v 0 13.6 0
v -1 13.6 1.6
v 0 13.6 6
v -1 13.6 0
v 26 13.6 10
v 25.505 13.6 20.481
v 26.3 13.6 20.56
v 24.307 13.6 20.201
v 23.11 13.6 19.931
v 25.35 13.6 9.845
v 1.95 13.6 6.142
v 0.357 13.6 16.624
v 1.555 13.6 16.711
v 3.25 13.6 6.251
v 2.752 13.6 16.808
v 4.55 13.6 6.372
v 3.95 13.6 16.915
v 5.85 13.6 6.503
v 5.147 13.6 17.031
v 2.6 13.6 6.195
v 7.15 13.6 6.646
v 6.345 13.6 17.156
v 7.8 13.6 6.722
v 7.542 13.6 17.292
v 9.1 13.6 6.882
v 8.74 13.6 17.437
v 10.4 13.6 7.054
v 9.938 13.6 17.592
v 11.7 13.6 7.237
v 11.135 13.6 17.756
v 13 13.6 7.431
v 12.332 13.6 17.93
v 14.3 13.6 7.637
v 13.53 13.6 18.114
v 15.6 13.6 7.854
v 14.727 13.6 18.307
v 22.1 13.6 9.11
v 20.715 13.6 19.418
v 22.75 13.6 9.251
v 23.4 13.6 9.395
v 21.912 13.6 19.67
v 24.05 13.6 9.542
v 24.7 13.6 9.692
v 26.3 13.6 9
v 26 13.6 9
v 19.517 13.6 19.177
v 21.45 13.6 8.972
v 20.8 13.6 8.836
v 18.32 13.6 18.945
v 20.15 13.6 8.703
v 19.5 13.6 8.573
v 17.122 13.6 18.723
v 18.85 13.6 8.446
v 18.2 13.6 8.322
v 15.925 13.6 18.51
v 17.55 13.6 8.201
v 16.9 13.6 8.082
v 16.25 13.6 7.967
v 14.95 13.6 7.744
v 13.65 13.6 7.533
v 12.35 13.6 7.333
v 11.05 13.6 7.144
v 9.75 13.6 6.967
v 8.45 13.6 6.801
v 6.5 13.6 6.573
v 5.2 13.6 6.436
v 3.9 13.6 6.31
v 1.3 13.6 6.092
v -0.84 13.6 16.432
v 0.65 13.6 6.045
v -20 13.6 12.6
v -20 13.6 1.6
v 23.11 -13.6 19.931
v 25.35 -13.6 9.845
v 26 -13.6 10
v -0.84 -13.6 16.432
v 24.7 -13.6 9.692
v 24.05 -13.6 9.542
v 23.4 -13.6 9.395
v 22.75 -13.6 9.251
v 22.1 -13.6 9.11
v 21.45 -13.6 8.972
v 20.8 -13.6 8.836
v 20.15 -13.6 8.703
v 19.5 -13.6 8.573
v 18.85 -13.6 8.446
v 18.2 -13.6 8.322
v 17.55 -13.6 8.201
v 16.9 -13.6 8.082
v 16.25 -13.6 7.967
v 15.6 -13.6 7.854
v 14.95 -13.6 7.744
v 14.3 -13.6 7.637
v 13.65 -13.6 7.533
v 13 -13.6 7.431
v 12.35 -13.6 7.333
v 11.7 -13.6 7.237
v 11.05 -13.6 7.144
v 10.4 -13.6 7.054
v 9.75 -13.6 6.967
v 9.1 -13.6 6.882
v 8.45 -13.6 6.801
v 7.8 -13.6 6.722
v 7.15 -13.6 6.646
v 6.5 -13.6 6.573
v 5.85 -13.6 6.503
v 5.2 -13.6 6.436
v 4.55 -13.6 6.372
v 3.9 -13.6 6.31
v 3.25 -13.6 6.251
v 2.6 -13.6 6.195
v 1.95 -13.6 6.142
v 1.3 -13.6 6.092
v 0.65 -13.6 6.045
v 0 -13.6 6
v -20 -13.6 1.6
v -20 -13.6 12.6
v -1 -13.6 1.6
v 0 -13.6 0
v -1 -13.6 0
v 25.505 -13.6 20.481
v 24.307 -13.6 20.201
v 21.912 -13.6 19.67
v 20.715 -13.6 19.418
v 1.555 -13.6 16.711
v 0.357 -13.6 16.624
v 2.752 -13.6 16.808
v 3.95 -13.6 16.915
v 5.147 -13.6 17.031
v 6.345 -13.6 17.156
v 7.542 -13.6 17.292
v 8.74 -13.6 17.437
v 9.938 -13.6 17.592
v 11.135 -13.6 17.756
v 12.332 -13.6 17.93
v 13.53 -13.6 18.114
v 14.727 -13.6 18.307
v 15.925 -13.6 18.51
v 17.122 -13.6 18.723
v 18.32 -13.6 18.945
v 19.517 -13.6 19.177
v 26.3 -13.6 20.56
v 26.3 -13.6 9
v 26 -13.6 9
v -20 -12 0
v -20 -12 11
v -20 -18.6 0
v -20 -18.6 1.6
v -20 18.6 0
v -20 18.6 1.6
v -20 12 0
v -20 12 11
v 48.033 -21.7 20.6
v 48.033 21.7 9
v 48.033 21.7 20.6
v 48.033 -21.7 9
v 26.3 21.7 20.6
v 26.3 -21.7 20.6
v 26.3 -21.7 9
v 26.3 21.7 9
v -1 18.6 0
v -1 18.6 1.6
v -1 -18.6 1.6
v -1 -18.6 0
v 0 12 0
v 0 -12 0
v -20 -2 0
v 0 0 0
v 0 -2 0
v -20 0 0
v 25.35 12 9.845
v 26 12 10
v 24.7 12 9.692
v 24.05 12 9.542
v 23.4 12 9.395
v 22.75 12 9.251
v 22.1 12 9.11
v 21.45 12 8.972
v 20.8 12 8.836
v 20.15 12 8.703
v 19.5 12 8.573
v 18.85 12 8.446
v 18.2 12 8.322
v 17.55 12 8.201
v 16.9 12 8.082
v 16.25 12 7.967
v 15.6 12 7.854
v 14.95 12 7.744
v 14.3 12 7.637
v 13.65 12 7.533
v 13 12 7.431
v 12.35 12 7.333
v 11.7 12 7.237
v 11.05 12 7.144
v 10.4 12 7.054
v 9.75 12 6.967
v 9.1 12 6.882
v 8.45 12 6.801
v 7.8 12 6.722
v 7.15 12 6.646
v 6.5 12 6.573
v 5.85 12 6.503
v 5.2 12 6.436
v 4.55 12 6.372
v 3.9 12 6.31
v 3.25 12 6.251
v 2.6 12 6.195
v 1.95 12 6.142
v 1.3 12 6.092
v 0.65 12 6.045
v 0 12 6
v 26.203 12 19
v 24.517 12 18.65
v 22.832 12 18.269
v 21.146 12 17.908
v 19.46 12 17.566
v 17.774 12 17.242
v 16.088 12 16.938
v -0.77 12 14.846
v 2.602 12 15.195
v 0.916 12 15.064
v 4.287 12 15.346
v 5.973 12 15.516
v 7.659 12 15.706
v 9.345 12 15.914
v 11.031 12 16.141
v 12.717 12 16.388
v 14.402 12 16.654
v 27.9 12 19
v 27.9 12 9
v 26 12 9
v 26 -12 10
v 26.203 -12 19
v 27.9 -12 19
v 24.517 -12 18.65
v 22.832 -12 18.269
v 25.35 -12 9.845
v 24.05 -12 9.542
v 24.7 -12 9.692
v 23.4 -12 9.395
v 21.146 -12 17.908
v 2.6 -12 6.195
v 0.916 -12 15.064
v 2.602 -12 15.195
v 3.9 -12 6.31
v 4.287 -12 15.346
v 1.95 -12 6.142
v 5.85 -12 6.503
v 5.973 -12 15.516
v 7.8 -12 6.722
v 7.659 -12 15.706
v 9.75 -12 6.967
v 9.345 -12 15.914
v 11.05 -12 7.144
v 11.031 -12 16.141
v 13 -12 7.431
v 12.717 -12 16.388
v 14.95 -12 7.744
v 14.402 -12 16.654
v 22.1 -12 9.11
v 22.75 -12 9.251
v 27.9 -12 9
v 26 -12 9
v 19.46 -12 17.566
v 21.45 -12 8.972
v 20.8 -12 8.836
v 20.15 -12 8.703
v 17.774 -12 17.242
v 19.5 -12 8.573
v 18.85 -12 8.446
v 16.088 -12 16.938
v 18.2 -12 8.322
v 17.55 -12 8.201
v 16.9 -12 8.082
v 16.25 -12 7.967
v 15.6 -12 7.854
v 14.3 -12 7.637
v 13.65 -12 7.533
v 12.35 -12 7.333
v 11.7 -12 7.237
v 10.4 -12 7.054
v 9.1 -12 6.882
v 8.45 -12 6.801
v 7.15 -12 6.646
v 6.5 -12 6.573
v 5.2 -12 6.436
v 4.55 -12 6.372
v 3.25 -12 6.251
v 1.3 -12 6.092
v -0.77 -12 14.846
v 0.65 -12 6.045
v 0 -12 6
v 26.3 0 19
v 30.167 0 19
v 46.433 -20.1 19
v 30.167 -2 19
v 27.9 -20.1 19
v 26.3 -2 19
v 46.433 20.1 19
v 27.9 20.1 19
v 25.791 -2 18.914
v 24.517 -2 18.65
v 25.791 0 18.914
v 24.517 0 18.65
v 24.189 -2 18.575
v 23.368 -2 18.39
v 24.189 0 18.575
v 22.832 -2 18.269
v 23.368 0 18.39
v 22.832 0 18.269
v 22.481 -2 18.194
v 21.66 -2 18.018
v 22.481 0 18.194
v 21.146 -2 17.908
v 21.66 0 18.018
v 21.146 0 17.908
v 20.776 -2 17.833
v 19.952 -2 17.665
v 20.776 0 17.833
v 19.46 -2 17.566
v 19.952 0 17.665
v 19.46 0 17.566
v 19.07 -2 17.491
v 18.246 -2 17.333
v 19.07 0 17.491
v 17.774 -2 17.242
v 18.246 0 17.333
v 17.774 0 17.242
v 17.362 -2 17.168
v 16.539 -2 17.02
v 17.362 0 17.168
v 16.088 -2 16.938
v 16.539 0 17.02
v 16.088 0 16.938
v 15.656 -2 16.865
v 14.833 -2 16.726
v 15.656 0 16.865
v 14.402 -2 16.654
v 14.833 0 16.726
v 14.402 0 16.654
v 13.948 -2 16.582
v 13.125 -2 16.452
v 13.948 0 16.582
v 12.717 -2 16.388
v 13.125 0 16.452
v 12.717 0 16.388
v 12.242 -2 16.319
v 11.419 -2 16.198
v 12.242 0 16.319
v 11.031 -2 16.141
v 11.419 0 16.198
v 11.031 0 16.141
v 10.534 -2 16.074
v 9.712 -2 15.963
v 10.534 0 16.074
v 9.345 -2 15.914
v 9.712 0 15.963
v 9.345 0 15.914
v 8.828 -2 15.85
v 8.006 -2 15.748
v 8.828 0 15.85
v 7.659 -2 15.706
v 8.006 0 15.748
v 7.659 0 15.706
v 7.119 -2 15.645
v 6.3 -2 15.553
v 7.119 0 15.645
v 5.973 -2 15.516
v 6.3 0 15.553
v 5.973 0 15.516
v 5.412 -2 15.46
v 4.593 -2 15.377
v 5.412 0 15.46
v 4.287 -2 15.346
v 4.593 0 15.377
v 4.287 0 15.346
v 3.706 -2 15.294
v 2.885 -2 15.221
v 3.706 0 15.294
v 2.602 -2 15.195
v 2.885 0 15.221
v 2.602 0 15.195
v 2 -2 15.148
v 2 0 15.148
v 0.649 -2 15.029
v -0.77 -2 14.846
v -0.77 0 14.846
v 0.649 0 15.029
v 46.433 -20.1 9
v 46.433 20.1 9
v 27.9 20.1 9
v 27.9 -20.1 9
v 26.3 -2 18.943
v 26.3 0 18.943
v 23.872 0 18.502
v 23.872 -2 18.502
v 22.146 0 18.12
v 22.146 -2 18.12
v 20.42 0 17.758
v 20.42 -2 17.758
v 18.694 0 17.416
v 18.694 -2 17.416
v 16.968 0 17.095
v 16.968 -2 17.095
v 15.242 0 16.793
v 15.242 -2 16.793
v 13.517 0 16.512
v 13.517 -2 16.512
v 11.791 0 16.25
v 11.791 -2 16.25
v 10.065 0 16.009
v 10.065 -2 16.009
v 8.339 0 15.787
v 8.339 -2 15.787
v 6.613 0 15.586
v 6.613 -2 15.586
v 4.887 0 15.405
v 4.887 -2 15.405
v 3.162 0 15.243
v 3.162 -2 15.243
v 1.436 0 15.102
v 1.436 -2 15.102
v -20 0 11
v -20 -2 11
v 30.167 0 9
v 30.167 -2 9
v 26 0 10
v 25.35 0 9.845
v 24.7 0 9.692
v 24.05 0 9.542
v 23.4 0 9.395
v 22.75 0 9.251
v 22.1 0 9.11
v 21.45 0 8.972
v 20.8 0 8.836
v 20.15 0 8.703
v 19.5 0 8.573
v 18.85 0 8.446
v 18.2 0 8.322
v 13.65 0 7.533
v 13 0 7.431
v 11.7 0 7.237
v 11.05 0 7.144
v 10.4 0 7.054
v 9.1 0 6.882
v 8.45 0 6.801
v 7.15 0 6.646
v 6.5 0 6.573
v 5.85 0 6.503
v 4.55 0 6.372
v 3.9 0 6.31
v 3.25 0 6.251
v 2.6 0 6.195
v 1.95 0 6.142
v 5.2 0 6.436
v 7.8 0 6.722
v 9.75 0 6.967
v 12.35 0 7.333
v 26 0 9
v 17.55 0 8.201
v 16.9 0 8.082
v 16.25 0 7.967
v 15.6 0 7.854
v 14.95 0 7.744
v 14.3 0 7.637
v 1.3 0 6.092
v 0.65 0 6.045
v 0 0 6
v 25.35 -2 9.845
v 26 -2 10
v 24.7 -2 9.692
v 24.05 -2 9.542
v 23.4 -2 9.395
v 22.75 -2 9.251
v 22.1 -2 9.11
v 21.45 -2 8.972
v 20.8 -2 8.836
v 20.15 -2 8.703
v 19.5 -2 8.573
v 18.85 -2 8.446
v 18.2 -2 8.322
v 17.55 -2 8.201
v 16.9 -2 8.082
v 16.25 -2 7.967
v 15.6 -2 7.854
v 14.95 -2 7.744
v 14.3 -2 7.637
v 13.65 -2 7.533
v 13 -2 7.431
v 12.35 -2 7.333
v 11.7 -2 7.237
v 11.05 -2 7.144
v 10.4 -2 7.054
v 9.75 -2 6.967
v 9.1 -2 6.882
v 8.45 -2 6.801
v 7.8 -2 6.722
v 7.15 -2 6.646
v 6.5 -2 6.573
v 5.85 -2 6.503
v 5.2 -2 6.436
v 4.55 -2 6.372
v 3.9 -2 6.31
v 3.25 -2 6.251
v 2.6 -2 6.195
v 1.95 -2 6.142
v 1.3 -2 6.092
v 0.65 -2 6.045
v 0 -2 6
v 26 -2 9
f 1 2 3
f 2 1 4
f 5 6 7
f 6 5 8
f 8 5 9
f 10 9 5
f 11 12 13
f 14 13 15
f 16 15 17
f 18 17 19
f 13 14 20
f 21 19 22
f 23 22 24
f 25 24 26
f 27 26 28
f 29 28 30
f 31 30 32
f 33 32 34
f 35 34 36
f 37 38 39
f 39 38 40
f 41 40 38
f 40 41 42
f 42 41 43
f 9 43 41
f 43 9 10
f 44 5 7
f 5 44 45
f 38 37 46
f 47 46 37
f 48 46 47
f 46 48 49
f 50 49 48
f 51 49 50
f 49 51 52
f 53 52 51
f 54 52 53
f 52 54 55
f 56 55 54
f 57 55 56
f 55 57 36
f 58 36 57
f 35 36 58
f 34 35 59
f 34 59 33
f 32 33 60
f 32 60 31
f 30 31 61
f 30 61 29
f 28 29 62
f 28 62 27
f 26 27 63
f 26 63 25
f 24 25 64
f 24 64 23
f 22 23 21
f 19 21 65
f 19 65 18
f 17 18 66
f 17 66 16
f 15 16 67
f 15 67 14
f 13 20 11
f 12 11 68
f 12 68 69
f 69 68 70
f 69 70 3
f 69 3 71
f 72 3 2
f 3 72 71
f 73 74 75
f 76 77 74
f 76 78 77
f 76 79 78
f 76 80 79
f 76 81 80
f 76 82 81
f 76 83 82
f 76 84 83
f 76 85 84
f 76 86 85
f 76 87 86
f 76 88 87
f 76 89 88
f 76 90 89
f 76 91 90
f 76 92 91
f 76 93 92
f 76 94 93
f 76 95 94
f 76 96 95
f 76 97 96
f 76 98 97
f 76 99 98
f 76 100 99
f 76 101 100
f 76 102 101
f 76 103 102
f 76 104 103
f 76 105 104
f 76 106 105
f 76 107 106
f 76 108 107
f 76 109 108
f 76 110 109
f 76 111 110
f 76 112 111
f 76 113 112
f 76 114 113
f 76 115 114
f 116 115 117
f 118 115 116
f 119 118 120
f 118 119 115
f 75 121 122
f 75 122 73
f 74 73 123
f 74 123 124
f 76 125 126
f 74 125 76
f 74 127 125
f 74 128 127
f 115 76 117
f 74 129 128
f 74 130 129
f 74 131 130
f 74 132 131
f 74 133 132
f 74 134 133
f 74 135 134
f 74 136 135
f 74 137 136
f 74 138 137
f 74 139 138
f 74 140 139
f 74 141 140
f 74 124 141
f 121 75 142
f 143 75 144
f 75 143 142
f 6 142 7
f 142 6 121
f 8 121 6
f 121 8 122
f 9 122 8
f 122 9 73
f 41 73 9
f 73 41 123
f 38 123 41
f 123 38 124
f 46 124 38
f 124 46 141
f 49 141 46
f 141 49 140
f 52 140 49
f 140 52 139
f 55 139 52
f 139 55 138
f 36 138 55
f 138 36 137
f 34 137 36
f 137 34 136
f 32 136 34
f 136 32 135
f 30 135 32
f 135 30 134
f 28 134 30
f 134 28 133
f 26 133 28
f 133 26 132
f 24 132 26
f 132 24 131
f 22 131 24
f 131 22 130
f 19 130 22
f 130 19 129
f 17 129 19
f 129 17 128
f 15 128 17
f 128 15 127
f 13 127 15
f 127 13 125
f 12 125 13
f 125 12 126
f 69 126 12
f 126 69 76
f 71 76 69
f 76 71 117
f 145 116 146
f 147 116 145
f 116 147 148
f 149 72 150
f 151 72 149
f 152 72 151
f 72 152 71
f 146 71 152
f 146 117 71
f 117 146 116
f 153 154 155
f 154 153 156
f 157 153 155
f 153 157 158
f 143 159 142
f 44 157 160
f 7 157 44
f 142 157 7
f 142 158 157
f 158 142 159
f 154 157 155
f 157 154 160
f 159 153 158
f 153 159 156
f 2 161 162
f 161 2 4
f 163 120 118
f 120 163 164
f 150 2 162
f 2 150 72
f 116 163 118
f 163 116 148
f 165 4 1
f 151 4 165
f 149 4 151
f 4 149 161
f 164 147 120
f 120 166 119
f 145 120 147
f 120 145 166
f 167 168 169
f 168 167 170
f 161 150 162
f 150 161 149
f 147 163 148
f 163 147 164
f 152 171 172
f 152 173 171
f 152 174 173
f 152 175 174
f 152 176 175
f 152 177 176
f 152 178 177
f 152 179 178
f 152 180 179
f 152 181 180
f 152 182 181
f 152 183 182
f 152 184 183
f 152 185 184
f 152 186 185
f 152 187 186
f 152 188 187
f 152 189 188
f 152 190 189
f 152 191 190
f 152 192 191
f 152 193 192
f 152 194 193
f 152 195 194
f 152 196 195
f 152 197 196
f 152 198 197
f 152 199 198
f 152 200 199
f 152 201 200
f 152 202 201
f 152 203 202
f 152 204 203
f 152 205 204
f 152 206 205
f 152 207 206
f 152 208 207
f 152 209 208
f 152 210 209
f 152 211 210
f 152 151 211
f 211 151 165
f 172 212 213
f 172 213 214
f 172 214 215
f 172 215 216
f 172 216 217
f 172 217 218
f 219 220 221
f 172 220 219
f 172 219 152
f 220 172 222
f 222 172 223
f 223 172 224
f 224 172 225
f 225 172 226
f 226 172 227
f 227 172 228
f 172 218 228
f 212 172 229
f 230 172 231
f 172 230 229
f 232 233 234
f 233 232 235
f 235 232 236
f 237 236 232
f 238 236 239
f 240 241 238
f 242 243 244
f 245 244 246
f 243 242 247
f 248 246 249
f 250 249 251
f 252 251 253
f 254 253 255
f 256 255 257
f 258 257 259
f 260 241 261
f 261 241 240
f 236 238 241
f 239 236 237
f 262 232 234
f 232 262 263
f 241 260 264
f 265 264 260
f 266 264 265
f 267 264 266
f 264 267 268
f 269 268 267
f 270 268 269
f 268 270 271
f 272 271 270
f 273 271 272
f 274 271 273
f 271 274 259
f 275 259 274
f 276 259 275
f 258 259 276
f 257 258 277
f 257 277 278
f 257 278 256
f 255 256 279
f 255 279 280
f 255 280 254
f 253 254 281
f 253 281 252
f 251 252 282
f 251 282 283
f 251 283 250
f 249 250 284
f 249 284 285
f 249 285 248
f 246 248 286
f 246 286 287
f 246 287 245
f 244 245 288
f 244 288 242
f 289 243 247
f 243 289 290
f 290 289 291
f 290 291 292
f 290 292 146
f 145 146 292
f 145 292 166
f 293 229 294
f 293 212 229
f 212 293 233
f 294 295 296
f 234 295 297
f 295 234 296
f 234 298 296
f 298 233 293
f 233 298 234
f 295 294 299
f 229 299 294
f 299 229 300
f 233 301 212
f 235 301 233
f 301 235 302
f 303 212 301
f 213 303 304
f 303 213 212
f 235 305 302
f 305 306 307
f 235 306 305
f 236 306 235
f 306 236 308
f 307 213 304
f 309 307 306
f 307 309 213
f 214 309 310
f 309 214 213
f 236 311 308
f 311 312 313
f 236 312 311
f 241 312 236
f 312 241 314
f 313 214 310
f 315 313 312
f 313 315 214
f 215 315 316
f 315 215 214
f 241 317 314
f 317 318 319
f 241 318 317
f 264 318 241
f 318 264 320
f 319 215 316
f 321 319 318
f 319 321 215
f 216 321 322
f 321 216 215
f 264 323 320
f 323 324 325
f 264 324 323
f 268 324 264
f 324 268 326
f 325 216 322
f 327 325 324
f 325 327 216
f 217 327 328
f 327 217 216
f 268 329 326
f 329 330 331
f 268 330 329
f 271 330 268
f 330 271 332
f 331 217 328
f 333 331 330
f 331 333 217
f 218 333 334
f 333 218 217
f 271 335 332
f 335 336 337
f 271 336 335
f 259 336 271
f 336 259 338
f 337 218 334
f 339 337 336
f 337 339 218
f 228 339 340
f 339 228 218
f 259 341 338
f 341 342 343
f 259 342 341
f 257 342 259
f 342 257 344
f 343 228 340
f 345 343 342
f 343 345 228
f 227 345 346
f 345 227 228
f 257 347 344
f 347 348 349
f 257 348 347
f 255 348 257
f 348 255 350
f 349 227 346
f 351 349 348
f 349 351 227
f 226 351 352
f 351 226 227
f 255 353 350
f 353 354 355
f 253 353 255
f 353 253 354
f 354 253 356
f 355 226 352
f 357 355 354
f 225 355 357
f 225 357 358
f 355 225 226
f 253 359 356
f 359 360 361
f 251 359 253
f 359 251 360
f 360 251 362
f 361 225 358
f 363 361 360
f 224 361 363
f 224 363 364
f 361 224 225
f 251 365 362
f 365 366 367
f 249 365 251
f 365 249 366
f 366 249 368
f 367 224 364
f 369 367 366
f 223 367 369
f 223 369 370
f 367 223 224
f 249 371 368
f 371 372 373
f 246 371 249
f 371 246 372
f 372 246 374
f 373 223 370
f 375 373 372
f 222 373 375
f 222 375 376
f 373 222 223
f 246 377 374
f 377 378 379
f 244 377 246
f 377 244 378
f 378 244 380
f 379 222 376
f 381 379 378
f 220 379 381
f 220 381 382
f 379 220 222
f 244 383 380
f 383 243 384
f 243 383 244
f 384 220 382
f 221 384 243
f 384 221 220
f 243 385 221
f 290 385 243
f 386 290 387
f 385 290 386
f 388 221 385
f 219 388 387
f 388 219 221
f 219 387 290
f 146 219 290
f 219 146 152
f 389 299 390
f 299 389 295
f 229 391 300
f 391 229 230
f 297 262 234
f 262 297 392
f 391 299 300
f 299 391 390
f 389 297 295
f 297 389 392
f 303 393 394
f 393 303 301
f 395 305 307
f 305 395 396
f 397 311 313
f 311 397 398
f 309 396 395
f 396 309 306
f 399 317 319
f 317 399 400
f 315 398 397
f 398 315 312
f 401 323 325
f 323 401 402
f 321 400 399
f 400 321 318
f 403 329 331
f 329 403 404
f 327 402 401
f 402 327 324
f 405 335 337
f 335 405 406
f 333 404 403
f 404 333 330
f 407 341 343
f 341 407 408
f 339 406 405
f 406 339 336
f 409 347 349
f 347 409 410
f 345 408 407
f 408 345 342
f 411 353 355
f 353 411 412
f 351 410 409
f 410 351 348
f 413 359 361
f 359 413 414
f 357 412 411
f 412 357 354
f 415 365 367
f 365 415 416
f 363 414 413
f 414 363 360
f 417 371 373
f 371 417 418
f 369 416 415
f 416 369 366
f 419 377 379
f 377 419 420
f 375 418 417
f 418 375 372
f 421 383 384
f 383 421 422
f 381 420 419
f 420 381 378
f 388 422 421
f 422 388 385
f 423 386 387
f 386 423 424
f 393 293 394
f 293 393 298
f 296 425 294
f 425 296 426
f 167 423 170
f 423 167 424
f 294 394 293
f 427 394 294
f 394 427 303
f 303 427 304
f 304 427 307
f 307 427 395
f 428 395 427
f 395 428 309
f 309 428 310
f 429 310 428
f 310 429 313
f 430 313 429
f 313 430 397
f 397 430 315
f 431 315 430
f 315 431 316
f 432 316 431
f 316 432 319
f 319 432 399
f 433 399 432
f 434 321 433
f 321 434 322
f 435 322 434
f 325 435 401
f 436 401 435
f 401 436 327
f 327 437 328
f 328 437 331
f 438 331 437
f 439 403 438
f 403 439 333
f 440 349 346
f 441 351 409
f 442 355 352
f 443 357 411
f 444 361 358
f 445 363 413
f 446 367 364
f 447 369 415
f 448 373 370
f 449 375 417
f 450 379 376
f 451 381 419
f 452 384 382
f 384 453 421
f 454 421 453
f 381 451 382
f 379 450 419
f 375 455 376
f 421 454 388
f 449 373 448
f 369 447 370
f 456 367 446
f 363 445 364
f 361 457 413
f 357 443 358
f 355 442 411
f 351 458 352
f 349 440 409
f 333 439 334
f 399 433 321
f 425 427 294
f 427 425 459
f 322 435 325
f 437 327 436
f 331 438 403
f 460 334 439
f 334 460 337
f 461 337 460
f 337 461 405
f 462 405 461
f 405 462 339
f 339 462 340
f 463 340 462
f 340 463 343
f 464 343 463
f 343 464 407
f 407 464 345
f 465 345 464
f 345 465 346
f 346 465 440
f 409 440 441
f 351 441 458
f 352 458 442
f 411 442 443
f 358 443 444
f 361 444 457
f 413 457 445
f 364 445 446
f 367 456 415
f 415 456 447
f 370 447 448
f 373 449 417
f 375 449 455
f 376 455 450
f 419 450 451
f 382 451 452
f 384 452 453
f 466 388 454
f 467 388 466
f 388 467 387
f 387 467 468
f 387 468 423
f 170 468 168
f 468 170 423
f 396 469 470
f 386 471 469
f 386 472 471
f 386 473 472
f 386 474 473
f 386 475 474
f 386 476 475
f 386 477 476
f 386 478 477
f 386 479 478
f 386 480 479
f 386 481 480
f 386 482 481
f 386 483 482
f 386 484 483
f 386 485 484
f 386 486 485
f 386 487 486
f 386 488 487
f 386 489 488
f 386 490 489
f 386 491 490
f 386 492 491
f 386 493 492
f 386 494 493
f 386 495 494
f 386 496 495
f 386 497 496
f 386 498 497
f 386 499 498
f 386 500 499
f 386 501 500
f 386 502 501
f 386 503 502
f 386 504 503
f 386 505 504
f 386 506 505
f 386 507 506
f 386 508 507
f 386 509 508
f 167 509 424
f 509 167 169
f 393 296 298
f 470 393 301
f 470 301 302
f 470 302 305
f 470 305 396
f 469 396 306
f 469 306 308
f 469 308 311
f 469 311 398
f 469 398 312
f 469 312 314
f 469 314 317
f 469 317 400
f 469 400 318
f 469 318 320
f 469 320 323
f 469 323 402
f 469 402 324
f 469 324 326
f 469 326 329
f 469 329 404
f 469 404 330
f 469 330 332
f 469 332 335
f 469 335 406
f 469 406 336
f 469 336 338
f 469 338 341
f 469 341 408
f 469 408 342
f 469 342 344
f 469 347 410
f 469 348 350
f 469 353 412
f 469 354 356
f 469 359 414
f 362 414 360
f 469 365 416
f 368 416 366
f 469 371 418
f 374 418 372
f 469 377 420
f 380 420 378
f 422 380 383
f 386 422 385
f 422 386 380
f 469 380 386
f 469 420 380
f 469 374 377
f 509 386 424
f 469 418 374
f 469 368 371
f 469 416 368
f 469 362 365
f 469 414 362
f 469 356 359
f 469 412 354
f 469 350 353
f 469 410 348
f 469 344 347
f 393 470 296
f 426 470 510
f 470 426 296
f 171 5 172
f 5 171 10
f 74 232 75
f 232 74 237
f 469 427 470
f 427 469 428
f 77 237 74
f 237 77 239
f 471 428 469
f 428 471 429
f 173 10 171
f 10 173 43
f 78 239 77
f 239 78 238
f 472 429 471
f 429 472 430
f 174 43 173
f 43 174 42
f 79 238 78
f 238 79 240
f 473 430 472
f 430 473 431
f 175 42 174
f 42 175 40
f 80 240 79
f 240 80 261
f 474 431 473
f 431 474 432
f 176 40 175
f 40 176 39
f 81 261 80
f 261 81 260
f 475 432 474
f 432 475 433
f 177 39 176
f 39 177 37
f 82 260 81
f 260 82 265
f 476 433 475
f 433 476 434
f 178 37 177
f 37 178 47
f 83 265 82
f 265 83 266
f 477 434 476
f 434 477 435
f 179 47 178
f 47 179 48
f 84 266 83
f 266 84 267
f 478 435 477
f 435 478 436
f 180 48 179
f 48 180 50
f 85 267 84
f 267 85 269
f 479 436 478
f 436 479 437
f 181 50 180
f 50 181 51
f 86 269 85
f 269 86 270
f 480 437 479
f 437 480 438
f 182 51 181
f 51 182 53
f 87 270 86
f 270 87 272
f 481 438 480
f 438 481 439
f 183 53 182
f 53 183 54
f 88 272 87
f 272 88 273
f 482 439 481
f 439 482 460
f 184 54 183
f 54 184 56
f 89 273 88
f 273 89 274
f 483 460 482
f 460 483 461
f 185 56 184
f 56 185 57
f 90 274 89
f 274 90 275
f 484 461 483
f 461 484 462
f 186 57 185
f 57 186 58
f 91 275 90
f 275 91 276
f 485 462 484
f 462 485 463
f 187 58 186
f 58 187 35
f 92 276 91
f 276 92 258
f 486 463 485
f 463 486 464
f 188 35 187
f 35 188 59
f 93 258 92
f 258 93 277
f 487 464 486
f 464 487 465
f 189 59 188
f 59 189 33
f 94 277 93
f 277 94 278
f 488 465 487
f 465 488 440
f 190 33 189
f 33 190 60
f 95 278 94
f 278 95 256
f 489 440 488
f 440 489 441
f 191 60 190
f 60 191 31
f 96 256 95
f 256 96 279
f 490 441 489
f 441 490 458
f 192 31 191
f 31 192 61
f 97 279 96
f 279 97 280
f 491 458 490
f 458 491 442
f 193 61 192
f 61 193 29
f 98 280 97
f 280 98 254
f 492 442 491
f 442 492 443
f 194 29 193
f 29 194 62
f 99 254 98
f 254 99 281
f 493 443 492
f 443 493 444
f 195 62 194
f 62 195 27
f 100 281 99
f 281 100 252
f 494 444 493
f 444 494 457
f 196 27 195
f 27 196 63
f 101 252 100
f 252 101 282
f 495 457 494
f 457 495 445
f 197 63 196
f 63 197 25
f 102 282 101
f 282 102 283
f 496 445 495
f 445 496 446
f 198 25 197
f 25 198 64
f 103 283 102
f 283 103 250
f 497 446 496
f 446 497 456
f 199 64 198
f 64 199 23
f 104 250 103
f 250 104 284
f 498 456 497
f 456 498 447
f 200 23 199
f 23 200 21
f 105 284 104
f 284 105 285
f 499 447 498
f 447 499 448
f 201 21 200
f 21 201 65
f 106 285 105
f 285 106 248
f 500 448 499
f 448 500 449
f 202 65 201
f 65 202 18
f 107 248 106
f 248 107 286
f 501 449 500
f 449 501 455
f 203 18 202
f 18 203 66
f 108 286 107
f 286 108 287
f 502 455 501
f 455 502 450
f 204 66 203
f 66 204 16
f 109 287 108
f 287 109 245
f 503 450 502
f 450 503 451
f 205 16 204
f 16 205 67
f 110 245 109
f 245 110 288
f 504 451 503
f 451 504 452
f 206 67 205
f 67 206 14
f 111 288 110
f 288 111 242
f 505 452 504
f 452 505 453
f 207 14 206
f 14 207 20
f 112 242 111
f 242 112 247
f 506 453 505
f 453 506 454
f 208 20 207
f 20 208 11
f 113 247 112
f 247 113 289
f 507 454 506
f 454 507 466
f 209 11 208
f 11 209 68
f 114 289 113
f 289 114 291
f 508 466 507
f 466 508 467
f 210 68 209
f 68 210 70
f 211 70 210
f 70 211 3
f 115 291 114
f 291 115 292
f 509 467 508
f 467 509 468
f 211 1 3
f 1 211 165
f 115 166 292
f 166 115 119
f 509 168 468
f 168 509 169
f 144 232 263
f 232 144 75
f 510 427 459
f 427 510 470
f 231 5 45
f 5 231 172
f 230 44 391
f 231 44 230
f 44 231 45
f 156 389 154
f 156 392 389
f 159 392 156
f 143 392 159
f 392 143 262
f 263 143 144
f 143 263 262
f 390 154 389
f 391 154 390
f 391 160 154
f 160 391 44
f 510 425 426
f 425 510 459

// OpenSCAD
// ============================================================
//  Cable cover: indoor 503 (BTicino Livinglight, 3 modules) -> ESP32 box
//
//  The cables (230 V + 2 ethernet from the outdoor plate) leave the
//  indoor 503 through a PRE-DRILLED Livinglight blank in the leftmost
//  module. This cover:
//    - sits on the blank face, inside the plate window (it covers the
//      whole module, so it looks like a module of its own);
//    - climbs over the curved left border of the plate;
//    - crosses the gap to the wall and ends against the right wall of
//      the ESP32 box, in front of its side opening (signals above the
//      rib, 230 V below).
//  Open at the back (like a trunking): the wall, the plate and the blank
//  close it. An inner divider keeps the 230 V cable apart from the
//  ethernet cables all the way to the box (it ends at the blank hole).
//
//  Fixing: removable double-sided tape under the wall flanges and under
//  the cap walls. DO NOT glue it hard to the blank: the cover sits over
//  the plate border, so it must come off (pull it forward) before the
//  plate can be removed.
//
//  Box position: right wall of the box "gap" mm from the left edge of the
//  plate, TOP edge of the box box_top_y mm above the plate centre, so that
//  its side opening is centred on the plate (default: 124.4 mm above; the
//  ENCLOSURE line in the console of the box file gives the same number).
//
//  Coordinates: x to the right (x = 0 at the left edge of the plate),
//  y up (y = 0 at the plate centre), z out of the wall (z = 0 on the wall).
//  Print: lying on its top face (roof down), no supports except the
//  flanges (or print with the flanges on the bed: see print_flip).
//  Material: PETG (as the box).
// ============================================================

/* [Plate (measured)] */
pl_w     = 117.5;  // plate width
pl_h     = 78;     // plate height
win_w    = 67;     // window width (3 modules)
win_h    = 44;     // window height
bord_w   = 26;     // left border: outer edge -> window
t_edge   = 6;      // plate thickness at the outer edge
t_10     = 7;      // ... 10 mm in from the outer edge
t_max    = 10;     // ... at the window
blank_rec= 1;      // blank face behind the plate face

/* [Blank hole] */
hole_d   = 12;     // hole in the pre-drilled blank (drill it to 16 for 3 cables)
hole_dy  = 0;      // hole centre above the plate centre

/* [Channel] */
gap      = 20;     // plate left edge -> box right wall
ch_in_w  = 24;     // inner width (= box opening: 12 signals + 2 rib + 10 mains)
ch_clear = 9;      // inner height over the plate (largest cable + ~1)
open_h   = 11;     // box opening height (side_open_h in the box file)
t        = 1.6;    // wall / roof thickness
div_t    = 2;      // divider thickness (= the rib of the box)
div_y    = -2;     // divider bottom edge (y): 230 V below, signals above
flange_w = 5;      // wall flanges for the tape (each side, in the gap)
cap_clr  = 0.3;    // cap clearance in the window
cap_mods = 1;      // modules covered by the cap: 1 (pre-drilled blank only)
                   // or 2 (also the plain blank next to it: more room inside)
mod_w    = win_w/3; // window modules, from the left: pre-drilled blank,
                    // blank, Italian socket

/* [Box (for the preview only)] */
box_out_w = 144.8;
box_out_h = 257.2;
box_out_d = 36.6;
box_top_y = 124.4;  // top edge of the box above the side opening centre

$fn = 48;

// ---- derived ----
blank_z = t_max - blank_rec;
// left border profile: parabola through (0,t_edge) (10,t_10) (bord_w,t_max)
pa = ((t_max - t_edge) - (t_10 - t_edge) * bord_w / 10) / (bord_w*bord_w - 10*bord_w);
pb = (t_10 - t_edge) / 10 - pa * 10;
function pz(x) = x < 0 ? 0 : x <= bord_w ? t_edge + pb*x + pa*x*x : t_max;

cap_x0 = bord_w + cap_clr;
cap_x1 = bord_w + cap_mods*mod_w - cap_clr;
cap_h  = win_h - 2*cap_clr;
hole_x = bord_w + mod_w/2;
cap_zi = t_max + ch_clear;              // inside of the cap roof
// roof inside: ramps from the box opening up to the plate, then follows it
function zi(x) = x < 0 ? open_h + (pz(0) + ch_clear - open_h) * (x + gap) / gap
                       : min(pz(x) + ch_clear, cap_zi);
function zo(x) = zi(x) + t;

// region under f between x0 and x1, in the xz plane, y from y0 to y1
module under(x0, x1, y0, y1, outer = true, n = 40) {
    pts = concat([[x0, -1]],
                 [for (i = [0:n]) let(x = x0 + (x1 - x0) * i / n)
                     [x, outer ? zo(x) : zi(x)]],
                 [[x1, -1]]);
    translate([0, y1, 0]) rotate([90, 0, 0])
        linear_extrude(y1 - y0) polygon(pts);
}

// what is already there: wall, plate, blank
module env() {
    translate([-500, -500, -50]) cube([1000, 1000, 50]);
    difference() {
        translate([0, pl_h/2, 0]) rotate([90, 0, 0]) linear_extrude(pl_h)
            polygon(concat([[0, -1]],
                [for (i = [0:40]) let(x = bord_w * i / 40) [x, pz(x)]],
                [[pl_w - bord_w, t_max], [pl_w, t_edge], [pl_w, -1]]));
        translate([bord_w, -win_h/2, -1]) cube([win_w, win_h, 50]);
    }
    translate([bord_w, -win_h/2, -1]) cube([win_w, win_h, blank_z + 1]);
}

module cover() {
    yo = ch_in_w/2 + t;
    difference() {
        union() {
            difference() {
                union() {
                    under(-gap, cap_x0 + t, -yo, yo);                       // channel
                    translate([cap_x0, -cap_h/2, 0])
                        cube([cap_x1 - cap_x0, cap_h, cap_zi + t]);          // cap
                    translate([-gap, -yo - flange_w, 0])
                        cube([gap - 1, 2*(yo + flange_w), t]);               // flanges
                }
                under(-gap - 1, cap_x1 - t, -ch_in_w/2, ch_in_w/2, false);   // channel inside
                translate([cap_x0 + t, -cap_h/2 + t, -1])
                    cube([cap_x1 - cap_x0 - 2*t, cap_h - 2*t, cap_zi + 1]);  // cap inside
                translate([-gap - 1, -ch_in_w/2, -1])
                    cube([gap, ch_in_w, open_h + 1]);                         // flanges: cable path
            }
            // divider: from the box to the edge of the blank hole
            intersection() {
                translate([-gap, div_y, -1])
                    cube([hole_x - hole_d/2 - 1 + gap, div_t, 100]);
                union() {
                    under(-gap - 1, cap_x1, -50, 50, false);
                    translate([cap_x0, -50, -1]) cube([cap_x1 - cap_x0, 100, cap_zi + 1]);
                }
            }
        }
        env();
    }
}

cover();

// preview of the surroundings (%: not exported)
%env_preview();
module env_preview() {
    intersection() { env(); translate([-1, -pl_h/2, 0]) cube([pl_w + 2, pl_h, 30]); }
    translate([hole_x, hole_dy, blank_z - 2]) color("red") cylinder(d = hole_d, h = 2.1);
    translate([-gap - box_out_w, box_top_y - box_out_h, 0])
        cube([box_out_w, box_out_h, box_out_d]);
}

echo(str("COVER: cap top ", cap_zi + t, " mm from the wall, ",
         cap_zi + t - t_max, " mm in front of the plate; cap inside ",
         cap_x1 - cap_x0 - 2*t, " x ", cap_h - 2*t, " mm (hole up to ~",
         min(cap_x1 - cap_x0 - 2*t, ch_in_w) - 1, " mm)"));
